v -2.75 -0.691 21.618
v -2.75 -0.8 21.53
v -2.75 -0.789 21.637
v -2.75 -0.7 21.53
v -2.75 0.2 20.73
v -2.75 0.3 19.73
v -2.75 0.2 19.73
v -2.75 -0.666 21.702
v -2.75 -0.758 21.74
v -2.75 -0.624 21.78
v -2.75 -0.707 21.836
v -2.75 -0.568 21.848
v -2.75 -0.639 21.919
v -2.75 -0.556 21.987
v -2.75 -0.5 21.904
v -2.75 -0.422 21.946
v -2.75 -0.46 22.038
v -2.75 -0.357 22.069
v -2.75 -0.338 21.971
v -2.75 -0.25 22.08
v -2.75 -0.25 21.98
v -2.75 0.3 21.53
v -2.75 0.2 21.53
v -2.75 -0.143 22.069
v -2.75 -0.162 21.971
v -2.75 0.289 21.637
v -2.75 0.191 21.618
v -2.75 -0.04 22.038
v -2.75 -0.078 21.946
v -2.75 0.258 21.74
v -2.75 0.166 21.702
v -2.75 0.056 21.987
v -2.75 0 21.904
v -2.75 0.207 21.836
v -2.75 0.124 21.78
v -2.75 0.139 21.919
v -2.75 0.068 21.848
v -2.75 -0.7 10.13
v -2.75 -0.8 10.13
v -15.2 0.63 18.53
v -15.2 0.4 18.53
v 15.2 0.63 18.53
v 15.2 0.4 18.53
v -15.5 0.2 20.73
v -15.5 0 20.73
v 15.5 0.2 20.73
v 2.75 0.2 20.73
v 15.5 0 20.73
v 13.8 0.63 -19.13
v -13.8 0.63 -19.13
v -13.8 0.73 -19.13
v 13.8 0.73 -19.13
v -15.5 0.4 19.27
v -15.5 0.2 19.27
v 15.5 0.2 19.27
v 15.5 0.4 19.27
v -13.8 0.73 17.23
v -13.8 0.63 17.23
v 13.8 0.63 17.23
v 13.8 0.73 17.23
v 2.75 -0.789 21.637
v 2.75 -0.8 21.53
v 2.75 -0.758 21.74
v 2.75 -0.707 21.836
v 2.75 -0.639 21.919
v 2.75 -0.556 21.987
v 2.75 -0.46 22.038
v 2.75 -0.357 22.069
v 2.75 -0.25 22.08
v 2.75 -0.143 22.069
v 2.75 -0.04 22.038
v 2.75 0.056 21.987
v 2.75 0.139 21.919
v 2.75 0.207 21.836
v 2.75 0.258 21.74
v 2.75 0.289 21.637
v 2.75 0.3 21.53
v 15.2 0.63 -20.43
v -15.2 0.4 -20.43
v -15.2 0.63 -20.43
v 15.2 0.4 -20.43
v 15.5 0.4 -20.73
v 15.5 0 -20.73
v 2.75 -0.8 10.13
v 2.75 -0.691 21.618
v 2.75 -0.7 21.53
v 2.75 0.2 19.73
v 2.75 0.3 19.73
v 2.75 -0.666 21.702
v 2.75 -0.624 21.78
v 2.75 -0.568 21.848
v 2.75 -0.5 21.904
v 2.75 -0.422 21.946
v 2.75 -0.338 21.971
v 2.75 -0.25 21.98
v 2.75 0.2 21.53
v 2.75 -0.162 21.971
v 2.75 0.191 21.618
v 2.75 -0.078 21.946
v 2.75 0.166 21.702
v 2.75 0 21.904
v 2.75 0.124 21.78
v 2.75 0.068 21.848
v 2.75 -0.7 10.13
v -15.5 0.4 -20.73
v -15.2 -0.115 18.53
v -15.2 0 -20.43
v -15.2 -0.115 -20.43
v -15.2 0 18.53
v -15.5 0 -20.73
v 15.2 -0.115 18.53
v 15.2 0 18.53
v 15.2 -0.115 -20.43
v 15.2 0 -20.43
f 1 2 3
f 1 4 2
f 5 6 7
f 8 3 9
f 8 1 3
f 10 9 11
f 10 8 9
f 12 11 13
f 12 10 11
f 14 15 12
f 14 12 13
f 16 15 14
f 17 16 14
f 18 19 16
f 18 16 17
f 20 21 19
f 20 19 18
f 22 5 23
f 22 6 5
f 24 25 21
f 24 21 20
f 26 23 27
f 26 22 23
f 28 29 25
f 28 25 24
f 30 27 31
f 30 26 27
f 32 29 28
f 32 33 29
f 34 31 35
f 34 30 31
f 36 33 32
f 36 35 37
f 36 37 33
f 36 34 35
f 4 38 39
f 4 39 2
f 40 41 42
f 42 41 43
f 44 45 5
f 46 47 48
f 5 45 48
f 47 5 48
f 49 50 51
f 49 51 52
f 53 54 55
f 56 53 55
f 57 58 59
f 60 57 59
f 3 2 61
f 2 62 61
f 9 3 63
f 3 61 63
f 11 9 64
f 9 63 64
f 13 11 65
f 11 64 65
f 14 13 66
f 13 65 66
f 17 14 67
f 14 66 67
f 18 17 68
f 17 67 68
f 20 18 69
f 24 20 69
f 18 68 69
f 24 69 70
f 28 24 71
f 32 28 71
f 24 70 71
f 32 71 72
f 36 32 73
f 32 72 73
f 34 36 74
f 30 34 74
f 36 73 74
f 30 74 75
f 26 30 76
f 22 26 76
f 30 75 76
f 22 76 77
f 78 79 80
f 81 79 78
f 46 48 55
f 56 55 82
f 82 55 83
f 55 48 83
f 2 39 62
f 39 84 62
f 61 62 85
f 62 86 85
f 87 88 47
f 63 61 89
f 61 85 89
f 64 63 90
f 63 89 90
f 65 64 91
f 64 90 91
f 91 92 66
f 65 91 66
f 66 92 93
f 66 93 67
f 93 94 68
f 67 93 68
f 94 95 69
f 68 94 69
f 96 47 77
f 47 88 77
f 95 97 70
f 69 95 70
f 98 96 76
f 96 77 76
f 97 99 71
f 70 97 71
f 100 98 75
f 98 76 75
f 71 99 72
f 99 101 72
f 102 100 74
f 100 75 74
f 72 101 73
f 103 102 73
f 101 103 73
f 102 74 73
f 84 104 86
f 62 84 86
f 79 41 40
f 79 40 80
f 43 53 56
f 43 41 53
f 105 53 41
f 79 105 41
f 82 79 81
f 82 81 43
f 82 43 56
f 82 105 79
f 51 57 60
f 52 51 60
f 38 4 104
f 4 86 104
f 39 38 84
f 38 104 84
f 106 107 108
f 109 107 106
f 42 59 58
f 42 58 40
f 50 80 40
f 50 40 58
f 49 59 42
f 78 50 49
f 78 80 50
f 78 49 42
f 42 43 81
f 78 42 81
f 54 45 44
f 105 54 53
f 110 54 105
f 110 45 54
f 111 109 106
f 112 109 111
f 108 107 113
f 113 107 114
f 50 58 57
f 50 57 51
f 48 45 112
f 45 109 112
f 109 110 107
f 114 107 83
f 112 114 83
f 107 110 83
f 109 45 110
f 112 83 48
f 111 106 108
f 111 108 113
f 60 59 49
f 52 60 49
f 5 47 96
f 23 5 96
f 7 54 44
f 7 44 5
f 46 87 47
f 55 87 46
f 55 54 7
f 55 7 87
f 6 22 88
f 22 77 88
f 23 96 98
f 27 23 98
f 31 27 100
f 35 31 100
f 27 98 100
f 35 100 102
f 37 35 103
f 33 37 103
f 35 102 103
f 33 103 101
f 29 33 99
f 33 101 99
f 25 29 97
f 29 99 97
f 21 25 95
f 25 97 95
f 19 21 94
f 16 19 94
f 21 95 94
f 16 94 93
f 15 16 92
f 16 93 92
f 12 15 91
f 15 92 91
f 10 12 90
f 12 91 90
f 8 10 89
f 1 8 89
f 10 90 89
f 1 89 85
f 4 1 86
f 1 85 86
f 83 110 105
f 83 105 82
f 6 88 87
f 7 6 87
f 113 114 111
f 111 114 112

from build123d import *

# Parameters (mm, degrees)
SKETCH1_W           = 31
SKETCH1_H           = 41.46
BOSS_EXTRUDE1_DEPTH = 0.2
SKETCH2_W           = 31
SKETCH2_H           = 40
BOSS_EXTRUDE2_DEPTH = 0.2
SKETCH3_W           = 30.4
SKETCH3_H           = 38.96
BOSS_EXTRUDE3_DEPTH = 0.23
SKETCH4_W           = 30.4
SKETCH4_H           = 38.96
BOSS_EXTRUDE4_DEPTH = 0.115
BOSS_EXTRUDE5_DEPTH = 2.75
SKETCH7_W           = 27.6
SKETCH7_H           = 36.36
BOSS_EXTRUDE6_DEPTH = 0.1


with BuildPart() as part:
    # Sketch1 → Boss-Extrude1 (new body)
    with BuildSketch(Plane(origin=(0, 0, 0), x_dir=(1, 0, 0), z_dir=(0, 1, 0))):
        Rectangle(SKETCH1_W, SKETCH1_H)
    extrude(amount=BOSS_EXTRUDE1_DEPTH)

    # Sketch2 → Boss-Extrude2 (add)
    with BuildSketch(Plane(origin=(0, 0.2, 0), x_dir=(1, 0, 0), z_dir=(0, 1, 0))):
        with Locations((0, 0.73)):
            Rectangle(SKETCH2_W, SKETCH2_H)
    extrude(amount=BOSS_EXTRUDE2_DEPTH)

    # Sketch3 → Boss-Extrude3 (add)
    with BuildSketch(Plane(origin=(0, 0.4, 0), x_dir=(1, 0, 0), z_dir=(0, 1, 0))):
        with Locations((0, 0.95)):
            Rectangle(SKETCH3_W, SKETCH3_H)
    extrude(amount=BOSS_EXTRUDE3_DEPTH)

    # Sketch4 → Boss-Extrude4 (add)
    with BuildSketch(Plane.XZ):
        with Locations((0, -0.95)):
            Rectangle(SKETCH4_W, SKETCH4_H)
    extrude(amount=BOSS_EXTRUDE4_DEPTH)

    # Sketch5 → Boss-Extrude5 (add, symmetric)
    with BuildSketch(Plane(origin=(0, 0, 0), x_dir=(0, 0, -1), z_dir=(1, 0, 0))):
        with BuildLine():
            Line((-20.73, 0.2), (-21.53, 0.2))
            ThreePointArc((-21.53, 0.2), (-21.98, -0.25), (-21.53, -0.7))
            Line((-21.53, -0.7), (-10.13, -0.7))
            Line((-10.13, -0.7), (-10.13, -0.8))
            Line((-10.13, -0.8), (-21.53, -0.8))
            ThreePointArc((-21.53, -0.8), (-22.08, -0.25), (-21.53, 0.3))
            Line((-21.53, 0.3), (-19.73, 0.3))
            Line((-19.73, 0.3), (-19.73, 0.2))
            Line((-19.73, 0.2), (-20.73, 0.2))
        make_face()
    extrude(amount=BOSS_EXTRUDE5_DEPTH, both=True)

    # Sketch7 → Boss-Extrude6 (add)
    with BuildSketch(Plane(origin=(0, 0.63, 0), x_dir=(1, 0, 0), z_dir=(0, 1, 0))):
        with Locations((0, 0.95)):
            Rectangle(SKETCH7_W, SKETCH7_H)
    extrude(amount=BOSS_EXTRUDE6_DEPTH)


solid = part.part
